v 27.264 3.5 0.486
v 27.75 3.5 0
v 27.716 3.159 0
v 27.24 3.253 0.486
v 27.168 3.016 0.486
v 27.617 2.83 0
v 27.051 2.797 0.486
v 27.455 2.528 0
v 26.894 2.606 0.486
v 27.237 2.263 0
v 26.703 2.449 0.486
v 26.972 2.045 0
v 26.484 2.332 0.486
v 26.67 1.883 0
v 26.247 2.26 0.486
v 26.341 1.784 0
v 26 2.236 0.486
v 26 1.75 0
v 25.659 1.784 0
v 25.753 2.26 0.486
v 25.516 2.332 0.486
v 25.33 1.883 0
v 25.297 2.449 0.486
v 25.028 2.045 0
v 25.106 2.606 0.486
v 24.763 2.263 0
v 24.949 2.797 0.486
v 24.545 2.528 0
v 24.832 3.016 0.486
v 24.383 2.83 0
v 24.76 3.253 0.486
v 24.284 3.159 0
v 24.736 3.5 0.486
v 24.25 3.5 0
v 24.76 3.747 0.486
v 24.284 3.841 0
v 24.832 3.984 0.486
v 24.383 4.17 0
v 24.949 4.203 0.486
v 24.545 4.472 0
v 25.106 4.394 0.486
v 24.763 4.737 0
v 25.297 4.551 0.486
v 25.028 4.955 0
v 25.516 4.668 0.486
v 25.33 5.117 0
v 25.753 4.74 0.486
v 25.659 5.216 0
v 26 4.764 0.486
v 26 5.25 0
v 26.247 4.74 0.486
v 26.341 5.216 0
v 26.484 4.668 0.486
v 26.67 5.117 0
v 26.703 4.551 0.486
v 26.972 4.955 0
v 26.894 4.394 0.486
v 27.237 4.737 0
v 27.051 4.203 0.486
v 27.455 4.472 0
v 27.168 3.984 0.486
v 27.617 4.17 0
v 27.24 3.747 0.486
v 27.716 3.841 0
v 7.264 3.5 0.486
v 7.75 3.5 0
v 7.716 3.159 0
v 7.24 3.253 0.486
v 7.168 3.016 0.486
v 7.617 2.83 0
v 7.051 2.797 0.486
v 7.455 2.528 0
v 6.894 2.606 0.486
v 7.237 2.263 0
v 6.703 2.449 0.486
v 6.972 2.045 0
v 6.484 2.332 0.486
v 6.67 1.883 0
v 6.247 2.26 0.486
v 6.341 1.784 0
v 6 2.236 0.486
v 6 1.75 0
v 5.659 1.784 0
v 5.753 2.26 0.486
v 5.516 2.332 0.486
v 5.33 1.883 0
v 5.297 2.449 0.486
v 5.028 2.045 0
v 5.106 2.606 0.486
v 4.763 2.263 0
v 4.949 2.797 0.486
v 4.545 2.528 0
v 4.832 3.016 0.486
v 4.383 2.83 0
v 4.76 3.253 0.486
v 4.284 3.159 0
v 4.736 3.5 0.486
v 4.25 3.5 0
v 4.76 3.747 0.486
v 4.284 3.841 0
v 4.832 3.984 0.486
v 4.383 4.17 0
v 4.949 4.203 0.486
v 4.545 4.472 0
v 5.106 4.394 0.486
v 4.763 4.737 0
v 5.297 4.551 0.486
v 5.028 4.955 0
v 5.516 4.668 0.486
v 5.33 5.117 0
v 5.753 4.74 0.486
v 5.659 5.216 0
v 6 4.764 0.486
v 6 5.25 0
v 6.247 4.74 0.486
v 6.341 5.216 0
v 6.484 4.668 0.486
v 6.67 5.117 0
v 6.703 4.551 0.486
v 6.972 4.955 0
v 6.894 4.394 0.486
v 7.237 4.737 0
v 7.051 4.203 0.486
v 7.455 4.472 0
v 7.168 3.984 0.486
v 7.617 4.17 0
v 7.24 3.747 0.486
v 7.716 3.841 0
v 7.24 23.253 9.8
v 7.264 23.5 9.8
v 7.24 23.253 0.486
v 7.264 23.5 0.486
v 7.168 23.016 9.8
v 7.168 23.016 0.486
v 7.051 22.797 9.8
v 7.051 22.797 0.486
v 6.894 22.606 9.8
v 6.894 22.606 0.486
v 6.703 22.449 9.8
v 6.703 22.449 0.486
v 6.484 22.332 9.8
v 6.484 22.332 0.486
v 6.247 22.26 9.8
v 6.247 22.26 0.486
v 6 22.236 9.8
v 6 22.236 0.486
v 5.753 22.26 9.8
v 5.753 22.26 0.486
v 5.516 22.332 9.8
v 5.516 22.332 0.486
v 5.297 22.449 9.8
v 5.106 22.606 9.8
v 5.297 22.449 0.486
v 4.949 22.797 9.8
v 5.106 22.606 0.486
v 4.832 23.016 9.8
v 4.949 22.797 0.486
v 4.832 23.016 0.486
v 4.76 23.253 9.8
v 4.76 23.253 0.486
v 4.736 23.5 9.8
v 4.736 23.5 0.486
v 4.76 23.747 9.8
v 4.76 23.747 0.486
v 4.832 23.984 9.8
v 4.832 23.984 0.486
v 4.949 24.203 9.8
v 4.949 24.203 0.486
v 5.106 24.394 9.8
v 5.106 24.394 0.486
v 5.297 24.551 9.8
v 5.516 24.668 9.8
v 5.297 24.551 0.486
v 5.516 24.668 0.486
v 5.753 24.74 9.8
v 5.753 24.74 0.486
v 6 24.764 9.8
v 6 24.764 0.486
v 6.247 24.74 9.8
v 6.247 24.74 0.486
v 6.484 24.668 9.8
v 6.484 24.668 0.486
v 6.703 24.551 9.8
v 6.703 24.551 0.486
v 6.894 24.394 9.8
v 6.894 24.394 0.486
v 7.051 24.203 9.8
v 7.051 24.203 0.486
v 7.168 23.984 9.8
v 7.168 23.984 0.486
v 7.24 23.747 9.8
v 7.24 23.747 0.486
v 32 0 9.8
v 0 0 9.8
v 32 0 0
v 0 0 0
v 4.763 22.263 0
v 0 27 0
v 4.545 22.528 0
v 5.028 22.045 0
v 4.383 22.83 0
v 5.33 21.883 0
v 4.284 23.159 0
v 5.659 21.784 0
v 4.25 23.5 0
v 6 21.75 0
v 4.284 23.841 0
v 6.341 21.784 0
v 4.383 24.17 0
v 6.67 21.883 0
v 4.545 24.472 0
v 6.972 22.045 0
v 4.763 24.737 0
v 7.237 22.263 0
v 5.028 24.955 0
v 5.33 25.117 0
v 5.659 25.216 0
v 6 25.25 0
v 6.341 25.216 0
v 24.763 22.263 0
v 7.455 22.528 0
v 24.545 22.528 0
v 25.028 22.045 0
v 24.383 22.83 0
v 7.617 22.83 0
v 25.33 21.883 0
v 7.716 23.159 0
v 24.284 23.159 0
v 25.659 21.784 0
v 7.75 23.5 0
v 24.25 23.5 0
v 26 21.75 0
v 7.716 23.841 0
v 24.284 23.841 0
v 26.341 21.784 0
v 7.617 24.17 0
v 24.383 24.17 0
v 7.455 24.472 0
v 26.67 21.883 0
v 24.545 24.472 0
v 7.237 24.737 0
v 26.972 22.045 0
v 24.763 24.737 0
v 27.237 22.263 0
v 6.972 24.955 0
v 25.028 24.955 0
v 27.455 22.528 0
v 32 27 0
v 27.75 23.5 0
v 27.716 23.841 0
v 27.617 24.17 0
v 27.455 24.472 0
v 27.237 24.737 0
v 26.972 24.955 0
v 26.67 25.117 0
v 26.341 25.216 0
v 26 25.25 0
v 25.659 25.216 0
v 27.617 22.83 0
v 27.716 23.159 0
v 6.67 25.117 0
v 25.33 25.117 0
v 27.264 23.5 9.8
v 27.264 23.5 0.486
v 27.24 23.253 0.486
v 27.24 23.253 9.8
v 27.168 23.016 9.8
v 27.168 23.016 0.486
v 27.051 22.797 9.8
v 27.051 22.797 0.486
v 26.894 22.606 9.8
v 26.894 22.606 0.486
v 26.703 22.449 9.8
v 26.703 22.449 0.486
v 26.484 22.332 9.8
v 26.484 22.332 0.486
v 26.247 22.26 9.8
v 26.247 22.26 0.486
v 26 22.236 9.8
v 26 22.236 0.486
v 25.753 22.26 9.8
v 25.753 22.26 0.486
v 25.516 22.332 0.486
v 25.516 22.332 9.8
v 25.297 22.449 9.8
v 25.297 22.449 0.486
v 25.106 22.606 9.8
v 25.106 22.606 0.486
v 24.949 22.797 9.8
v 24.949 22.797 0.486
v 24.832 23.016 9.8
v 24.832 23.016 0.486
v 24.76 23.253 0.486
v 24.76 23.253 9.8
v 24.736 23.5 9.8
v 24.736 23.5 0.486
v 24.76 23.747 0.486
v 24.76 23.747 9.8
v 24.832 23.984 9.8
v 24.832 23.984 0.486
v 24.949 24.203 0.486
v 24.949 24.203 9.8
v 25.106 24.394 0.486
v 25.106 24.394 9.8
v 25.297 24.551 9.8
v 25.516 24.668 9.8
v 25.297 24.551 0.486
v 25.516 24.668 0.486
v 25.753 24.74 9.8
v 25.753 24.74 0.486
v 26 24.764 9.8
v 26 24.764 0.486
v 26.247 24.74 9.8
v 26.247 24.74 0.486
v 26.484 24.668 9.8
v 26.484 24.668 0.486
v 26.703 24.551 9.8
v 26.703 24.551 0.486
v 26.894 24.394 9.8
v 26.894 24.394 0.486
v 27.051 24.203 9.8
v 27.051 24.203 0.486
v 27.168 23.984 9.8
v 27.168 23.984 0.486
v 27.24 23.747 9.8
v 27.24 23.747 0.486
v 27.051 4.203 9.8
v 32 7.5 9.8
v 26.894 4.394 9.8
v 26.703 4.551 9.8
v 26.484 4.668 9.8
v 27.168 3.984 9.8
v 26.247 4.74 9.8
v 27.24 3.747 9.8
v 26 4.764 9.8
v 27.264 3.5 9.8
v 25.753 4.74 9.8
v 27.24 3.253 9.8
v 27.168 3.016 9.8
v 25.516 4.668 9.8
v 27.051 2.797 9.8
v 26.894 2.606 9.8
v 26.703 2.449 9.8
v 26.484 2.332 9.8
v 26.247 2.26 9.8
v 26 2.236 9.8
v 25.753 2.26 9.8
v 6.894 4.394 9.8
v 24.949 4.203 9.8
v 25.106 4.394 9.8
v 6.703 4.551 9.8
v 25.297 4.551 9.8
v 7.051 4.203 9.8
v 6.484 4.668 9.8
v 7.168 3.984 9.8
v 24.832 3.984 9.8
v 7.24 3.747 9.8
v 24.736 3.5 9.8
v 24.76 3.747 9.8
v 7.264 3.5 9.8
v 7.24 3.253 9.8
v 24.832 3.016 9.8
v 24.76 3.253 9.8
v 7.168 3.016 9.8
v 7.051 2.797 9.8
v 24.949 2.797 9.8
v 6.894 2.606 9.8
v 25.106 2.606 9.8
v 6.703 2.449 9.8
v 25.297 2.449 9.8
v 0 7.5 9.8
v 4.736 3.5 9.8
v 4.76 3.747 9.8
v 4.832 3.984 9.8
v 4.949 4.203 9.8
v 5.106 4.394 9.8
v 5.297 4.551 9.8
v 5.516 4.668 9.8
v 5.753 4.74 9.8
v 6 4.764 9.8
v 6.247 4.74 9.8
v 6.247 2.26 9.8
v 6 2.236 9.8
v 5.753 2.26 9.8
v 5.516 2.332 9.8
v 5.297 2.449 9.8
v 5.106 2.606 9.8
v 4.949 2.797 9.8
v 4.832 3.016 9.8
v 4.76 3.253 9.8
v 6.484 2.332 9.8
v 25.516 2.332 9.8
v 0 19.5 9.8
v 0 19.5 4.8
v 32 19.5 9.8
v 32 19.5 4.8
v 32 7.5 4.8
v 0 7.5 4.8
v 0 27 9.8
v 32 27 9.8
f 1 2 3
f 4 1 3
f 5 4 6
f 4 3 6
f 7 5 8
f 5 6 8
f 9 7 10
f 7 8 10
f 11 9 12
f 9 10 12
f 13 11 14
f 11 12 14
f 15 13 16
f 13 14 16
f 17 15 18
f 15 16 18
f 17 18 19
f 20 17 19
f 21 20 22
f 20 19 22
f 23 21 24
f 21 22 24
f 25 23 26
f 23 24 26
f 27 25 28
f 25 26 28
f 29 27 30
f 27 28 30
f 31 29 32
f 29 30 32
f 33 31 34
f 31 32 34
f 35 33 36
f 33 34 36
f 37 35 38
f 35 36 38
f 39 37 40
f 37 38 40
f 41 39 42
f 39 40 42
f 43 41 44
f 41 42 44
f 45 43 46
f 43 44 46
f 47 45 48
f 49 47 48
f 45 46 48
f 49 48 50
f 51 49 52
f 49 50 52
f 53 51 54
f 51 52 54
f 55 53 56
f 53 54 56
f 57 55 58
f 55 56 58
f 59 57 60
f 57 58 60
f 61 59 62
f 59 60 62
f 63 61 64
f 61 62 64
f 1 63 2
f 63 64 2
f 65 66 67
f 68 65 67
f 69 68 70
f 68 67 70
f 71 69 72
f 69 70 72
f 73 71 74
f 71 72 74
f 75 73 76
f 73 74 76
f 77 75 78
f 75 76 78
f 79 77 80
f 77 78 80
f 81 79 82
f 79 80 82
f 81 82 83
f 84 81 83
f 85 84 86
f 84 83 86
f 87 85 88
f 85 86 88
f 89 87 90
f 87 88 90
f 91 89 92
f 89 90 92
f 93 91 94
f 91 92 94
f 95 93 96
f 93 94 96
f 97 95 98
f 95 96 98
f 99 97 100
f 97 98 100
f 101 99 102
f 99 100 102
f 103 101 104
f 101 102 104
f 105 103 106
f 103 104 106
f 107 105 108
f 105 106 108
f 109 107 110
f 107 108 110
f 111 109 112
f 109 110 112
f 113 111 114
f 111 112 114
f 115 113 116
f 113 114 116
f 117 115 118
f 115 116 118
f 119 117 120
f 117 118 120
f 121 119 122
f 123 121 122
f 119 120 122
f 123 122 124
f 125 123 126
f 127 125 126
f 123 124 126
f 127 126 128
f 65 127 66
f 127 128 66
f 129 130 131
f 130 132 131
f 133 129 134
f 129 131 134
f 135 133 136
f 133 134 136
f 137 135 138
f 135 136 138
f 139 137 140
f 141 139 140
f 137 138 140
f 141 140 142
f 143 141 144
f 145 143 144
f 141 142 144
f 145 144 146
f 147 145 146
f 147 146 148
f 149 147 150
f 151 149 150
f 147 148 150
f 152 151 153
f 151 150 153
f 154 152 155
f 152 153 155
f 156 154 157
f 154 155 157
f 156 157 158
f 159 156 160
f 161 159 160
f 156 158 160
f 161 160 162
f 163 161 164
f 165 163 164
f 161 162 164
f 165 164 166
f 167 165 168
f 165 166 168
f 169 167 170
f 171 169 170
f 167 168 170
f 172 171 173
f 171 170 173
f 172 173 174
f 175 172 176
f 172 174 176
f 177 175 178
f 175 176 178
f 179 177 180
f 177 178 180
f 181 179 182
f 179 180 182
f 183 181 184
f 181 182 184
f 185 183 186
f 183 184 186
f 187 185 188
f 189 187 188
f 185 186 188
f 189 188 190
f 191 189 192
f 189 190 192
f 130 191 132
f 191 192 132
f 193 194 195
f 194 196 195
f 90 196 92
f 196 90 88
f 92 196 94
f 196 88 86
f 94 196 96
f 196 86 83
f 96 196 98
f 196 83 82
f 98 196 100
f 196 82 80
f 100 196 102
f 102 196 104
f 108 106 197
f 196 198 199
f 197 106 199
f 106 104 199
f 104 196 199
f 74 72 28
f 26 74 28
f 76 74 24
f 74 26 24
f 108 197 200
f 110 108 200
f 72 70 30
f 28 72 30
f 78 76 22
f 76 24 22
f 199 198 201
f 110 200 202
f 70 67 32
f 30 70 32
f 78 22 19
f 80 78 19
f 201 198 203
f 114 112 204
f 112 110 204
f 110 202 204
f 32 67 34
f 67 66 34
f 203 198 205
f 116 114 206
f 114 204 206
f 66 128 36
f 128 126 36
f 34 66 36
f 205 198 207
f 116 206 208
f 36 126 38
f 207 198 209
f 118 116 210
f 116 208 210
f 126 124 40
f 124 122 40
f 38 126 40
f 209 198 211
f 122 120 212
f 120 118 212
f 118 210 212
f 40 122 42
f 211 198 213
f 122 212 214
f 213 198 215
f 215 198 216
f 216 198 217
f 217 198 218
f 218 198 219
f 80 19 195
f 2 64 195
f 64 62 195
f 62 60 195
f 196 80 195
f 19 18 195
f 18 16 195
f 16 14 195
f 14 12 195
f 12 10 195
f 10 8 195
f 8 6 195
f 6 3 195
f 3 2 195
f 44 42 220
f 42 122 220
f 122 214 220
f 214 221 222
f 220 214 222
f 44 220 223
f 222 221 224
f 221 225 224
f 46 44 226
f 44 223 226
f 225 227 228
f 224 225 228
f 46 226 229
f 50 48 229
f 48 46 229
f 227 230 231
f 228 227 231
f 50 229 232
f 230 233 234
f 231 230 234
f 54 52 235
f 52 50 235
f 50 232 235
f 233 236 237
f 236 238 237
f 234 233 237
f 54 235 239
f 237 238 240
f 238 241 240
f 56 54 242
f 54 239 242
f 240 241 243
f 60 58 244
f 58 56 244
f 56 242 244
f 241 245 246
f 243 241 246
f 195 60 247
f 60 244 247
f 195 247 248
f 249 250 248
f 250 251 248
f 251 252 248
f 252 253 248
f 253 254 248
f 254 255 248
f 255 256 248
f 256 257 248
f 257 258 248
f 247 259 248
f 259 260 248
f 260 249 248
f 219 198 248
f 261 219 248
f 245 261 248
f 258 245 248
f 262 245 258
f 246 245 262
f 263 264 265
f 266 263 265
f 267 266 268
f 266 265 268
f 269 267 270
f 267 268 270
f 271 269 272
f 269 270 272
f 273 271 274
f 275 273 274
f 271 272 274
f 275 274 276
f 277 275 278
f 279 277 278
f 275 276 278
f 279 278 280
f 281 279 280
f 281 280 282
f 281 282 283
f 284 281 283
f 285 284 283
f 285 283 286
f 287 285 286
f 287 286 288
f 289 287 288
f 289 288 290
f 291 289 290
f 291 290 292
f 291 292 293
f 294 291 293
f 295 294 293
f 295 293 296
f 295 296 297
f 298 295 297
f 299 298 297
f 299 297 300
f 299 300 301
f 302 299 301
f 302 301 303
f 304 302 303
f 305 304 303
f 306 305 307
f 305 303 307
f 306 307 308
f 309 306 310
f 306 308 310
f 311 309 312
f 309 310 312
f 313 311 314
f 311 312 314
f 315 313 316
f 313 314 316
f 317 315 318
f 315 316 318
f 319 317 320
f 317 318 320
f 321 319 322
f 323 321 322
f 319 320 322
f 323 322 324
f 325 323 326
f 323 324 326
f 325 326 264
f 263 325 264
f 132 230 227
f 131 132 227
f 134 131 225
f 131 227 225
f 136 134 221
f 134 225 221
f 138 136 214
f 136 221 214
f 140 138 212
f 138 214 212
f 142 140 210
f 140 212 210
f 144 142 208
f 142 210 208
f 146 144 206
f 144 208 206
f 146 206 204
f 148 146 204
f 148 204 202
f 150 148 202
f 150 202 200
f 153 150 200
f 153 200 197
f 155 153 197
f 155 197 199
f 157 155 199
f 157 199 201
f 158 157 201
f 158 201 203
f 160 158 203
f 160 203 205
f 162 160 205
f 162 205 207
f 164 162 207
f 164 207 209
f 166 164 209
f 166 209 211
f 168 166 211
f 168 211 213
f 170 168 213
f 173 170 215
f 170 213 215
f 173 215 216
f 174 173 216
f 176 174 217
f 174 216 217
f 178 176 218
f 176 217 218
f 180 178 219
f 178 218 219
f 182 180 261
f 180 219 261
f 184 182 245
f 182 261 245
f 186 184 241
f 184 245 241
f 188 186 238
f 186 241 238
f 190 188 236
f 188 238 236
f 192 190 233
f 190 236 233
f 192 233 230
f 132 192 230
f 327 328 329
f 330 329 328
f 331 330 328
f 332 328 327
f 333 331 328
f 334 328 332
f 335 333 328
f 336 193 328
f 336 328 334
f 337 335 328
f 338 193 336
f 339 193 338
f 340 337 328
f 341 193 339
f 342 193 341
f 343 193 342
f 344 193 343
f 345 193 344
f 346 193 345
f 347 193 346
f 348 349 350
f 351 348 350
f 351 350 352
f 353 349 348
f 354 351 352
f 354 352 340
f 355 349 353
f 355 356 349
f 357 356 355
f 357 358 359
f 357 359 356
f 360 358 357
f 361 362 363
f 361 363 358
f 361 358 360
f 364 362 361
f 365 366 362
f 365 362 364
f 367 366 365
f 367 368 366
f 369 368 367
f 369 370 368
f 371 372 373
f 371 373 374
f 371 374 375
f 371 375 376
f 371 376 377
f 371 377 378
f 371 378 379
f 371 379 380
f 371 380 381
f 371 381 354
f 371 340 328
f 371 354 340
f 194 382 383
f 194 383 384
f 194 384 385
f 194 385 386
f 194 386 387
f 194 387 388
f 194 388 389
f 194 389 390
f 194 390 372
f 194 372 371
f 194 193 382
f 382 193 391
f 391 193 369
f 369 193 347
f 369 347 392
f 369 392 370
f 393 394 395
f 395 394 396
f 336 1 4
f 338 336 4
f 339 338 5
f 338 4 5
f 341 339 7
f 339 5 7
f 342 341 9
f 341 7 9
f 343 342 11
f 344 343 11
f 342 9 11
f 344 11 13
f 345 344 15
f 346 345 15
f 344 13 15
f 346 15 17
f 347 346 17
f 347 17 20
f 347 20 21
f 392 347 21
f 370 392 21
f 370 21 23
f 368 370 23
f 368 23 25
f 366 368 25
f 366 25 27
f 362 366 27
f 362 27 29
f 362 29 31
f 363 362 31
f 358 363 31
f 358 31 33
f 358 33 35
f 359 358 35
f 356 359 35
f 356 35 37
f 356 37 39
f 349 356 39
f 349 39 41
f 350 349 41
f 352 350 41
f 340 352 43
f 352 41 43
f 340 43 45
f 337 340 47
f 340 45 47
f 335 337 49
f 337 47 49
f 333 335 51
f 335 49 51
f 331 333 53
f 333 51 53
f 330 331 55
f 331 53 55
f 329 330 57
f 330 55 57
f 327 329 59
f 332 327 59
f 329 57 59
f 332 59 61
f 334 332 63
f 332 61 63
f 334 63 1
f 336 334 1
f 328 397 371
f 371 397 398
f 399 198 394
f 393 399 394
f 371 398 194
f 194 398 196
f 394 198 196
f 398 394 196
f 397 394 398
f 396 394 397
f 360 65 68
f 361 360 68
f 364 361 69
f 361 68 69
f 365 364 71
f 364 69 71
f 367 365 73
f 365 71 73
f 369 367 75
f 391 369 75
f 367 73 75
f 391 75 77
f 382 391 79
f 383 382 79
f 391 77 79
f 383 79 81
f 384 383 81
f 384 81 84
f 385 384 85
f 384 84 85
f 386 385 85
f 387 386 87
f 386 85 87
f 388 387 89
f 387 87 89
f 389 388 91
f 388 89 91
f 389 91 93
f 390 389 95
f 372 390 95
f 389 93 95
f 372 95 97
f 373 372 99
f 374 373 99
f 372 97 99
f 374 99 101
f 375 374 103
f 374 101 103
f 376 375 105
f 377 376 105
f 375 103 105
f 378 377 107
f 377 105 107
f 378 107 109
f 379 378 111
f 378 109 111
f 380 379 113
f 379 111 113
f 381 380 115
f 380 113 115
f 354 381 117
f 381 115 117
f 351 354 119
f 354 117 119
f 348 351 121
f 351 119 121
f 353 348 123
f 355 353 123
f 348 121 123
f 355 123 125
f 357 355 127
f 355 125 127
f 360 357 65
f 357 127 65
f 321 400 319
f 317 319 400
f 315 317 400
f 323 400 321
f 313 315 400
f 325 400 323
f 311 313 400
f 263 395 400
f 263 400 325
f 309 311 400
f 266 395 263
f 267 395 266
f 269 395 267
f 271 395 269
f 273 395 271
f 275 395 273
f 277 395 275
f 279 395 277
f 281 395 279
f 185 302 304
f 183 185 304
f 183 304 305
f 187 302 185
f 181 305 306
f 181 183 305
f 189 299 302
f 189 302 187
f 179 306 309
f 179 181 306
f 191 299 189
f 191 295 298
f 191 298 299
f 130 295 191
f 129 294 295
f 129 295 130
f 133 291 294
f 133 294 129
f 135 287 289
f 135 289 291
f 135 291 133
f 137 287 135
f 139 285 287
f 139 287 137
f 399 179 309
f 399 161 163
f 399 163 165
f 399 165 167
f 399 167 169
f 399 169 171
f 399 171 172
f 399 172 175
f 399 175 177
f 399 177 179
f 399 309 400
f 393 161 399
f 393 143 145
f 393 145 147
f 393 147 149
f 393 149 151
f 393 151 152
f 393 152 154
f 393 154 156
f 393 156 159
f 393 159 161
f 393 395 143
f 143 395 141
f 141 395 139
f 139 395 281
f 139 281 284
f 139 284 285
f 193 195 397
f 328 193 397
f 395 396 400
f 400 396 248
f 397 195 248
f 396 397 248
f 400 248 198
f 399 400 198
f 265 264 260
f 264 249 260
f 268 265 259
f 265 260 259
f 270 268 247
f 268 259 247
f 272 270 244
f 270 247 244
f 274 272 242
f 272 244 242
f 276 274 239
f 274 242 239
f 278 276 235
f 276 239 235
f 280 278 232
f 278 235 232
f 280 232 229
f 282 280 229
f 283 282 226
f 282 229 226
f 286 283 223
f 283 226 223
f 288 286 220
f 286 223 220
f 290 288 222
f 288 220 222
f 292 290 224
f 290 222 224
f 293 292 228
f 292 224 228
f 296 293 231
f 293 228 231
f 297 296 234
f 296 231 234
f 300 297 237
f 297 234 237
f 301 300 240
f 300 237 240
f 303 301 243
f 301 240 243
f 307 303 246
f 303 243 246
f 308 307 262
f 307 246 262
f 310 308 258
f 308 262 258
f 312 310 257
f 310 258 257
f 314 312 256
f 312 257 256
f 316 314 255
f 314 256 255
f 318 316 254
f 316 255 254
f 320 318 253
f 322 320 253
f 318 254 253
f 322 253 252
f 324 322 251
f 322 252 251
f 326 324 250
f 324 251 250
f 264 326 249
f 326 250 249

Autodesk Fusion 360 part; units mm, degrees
sketch "Sketch1" plane through (0, 0, 0) normal (0, 0, 1) x (1, 0, 0)
  line L0 (0, 0) -> (32, 0)
  line L1 (32, 0) -> (32, 27)
  line L2 (32, 27) -> (0, 27)
  line L3 (0, 27) -> (0, 0)
  dimension "d1" = 27
  dimension "d2" = 32
extrude "Extrude1" add sketch "Sketch1" along normal blind 4.8
sketch "Sketch2" plane through (0, 0, 4.8) normal (0, 0, 1) x (-1, 0, 0)
  line L0 (0, -27) -> (0, 0)
  line L1 (0, 0) -> (-32, 0)
  line L2 (-32, 0) -> (-32, -27)
  line L3 (-32, -27) -> (0, -27)
  line L4 (0, 0) -> (-32, 0)
  line L5 (-32, 0) -> (-32, -7.5)
  line L6 (-32, -7.5) -> (0, -7.5)
  line L7 (0, -7.5) -> (0, 0)
  line L8 (-32, -27) -> (0, -27)
  line L9 (0, -27) -> (0, -19.5)
  line L10 (0, -19.5) -> (-32, -19.5)
  line L11 (-32, -19.5) -> (-32, -27)
  dimension "d5" = 12
  dimension "d6" = 7.5
  dimension "d7" = 8.2363
extrude "Extrude2" add sketch "Sketch2" along normal blind 5 contours L0 L2 L3 L8 L9 L10 L11 | L0 L1 L2 L4 L5 L6 L7
sketch "Sketch3" plane through (0, 0, 0) normal (0, 0, -1) x (1, 0, 0)
  line L0 (0, 0) -> (0, -27)
  line L1 (0, -27) -> (32, -27)
  line L2 (32, -27) -> (32, 0)
  line L3 (32, 0) -> (0, 0)
  line L4 (6, -3.5) -> (26, -3.5)
  line L5 (26, -3.5) -> (26, -23.5)
  line L6 (26, -23.5) -> (6, -23.5)
  line L7 (6, -23.5) -> (6, -3.5)
  circle A0 centre (6, -3.5) radius 1.5
  circle A1 centre (26, -3.5) radius 1.5
  circle A2 centre (6, -23.5) radius 1.5
  circle A3 centre (26, -23.5) radius 1.5
  dimension "d10" = 20
  dimension "d11" = 20
  dimension "d12" = 3.5
  dimension "d13" = 3
  dimension "d14" = 6
  dimension "d15" = 6
  dimension "d16" = 3
  dimension "d17" = 3
  dimension "d18" = 3
  dimension "d19" = 3
extrude "Extrude3" cut sketch "Sketch3" against normal blind 20 contours L4 L7 A0 | L4 L7 A0 | L4 L5 A1 | L4 L5 A1 | L6 L7 A2 | L6 L7 A2 | L5 L6 A3 | L5 L6 A3
chamfer "Chamfer1" distance 0.25 angle 45 4 edges at (4.6015, 2.9576, 0) (24.6015, 2.9576, 0) (24.6015, 22.9576, 0) (4.6015, 22.9576, 0)
thread "Thread1" "ISO Metric profile 3.0 M3x0.5 6H" major diameter 3.086 minor diameter 2.529 pitch 0.5 angle 60 resizes the face on face at (7.4925, 23.3506, 3.4333) on face at (27.4925, 23.3506, 3.4333) on face at (27.4981, 3.5748, 6.6167) on face at (7.4981, 3.5748, 6.6167)
